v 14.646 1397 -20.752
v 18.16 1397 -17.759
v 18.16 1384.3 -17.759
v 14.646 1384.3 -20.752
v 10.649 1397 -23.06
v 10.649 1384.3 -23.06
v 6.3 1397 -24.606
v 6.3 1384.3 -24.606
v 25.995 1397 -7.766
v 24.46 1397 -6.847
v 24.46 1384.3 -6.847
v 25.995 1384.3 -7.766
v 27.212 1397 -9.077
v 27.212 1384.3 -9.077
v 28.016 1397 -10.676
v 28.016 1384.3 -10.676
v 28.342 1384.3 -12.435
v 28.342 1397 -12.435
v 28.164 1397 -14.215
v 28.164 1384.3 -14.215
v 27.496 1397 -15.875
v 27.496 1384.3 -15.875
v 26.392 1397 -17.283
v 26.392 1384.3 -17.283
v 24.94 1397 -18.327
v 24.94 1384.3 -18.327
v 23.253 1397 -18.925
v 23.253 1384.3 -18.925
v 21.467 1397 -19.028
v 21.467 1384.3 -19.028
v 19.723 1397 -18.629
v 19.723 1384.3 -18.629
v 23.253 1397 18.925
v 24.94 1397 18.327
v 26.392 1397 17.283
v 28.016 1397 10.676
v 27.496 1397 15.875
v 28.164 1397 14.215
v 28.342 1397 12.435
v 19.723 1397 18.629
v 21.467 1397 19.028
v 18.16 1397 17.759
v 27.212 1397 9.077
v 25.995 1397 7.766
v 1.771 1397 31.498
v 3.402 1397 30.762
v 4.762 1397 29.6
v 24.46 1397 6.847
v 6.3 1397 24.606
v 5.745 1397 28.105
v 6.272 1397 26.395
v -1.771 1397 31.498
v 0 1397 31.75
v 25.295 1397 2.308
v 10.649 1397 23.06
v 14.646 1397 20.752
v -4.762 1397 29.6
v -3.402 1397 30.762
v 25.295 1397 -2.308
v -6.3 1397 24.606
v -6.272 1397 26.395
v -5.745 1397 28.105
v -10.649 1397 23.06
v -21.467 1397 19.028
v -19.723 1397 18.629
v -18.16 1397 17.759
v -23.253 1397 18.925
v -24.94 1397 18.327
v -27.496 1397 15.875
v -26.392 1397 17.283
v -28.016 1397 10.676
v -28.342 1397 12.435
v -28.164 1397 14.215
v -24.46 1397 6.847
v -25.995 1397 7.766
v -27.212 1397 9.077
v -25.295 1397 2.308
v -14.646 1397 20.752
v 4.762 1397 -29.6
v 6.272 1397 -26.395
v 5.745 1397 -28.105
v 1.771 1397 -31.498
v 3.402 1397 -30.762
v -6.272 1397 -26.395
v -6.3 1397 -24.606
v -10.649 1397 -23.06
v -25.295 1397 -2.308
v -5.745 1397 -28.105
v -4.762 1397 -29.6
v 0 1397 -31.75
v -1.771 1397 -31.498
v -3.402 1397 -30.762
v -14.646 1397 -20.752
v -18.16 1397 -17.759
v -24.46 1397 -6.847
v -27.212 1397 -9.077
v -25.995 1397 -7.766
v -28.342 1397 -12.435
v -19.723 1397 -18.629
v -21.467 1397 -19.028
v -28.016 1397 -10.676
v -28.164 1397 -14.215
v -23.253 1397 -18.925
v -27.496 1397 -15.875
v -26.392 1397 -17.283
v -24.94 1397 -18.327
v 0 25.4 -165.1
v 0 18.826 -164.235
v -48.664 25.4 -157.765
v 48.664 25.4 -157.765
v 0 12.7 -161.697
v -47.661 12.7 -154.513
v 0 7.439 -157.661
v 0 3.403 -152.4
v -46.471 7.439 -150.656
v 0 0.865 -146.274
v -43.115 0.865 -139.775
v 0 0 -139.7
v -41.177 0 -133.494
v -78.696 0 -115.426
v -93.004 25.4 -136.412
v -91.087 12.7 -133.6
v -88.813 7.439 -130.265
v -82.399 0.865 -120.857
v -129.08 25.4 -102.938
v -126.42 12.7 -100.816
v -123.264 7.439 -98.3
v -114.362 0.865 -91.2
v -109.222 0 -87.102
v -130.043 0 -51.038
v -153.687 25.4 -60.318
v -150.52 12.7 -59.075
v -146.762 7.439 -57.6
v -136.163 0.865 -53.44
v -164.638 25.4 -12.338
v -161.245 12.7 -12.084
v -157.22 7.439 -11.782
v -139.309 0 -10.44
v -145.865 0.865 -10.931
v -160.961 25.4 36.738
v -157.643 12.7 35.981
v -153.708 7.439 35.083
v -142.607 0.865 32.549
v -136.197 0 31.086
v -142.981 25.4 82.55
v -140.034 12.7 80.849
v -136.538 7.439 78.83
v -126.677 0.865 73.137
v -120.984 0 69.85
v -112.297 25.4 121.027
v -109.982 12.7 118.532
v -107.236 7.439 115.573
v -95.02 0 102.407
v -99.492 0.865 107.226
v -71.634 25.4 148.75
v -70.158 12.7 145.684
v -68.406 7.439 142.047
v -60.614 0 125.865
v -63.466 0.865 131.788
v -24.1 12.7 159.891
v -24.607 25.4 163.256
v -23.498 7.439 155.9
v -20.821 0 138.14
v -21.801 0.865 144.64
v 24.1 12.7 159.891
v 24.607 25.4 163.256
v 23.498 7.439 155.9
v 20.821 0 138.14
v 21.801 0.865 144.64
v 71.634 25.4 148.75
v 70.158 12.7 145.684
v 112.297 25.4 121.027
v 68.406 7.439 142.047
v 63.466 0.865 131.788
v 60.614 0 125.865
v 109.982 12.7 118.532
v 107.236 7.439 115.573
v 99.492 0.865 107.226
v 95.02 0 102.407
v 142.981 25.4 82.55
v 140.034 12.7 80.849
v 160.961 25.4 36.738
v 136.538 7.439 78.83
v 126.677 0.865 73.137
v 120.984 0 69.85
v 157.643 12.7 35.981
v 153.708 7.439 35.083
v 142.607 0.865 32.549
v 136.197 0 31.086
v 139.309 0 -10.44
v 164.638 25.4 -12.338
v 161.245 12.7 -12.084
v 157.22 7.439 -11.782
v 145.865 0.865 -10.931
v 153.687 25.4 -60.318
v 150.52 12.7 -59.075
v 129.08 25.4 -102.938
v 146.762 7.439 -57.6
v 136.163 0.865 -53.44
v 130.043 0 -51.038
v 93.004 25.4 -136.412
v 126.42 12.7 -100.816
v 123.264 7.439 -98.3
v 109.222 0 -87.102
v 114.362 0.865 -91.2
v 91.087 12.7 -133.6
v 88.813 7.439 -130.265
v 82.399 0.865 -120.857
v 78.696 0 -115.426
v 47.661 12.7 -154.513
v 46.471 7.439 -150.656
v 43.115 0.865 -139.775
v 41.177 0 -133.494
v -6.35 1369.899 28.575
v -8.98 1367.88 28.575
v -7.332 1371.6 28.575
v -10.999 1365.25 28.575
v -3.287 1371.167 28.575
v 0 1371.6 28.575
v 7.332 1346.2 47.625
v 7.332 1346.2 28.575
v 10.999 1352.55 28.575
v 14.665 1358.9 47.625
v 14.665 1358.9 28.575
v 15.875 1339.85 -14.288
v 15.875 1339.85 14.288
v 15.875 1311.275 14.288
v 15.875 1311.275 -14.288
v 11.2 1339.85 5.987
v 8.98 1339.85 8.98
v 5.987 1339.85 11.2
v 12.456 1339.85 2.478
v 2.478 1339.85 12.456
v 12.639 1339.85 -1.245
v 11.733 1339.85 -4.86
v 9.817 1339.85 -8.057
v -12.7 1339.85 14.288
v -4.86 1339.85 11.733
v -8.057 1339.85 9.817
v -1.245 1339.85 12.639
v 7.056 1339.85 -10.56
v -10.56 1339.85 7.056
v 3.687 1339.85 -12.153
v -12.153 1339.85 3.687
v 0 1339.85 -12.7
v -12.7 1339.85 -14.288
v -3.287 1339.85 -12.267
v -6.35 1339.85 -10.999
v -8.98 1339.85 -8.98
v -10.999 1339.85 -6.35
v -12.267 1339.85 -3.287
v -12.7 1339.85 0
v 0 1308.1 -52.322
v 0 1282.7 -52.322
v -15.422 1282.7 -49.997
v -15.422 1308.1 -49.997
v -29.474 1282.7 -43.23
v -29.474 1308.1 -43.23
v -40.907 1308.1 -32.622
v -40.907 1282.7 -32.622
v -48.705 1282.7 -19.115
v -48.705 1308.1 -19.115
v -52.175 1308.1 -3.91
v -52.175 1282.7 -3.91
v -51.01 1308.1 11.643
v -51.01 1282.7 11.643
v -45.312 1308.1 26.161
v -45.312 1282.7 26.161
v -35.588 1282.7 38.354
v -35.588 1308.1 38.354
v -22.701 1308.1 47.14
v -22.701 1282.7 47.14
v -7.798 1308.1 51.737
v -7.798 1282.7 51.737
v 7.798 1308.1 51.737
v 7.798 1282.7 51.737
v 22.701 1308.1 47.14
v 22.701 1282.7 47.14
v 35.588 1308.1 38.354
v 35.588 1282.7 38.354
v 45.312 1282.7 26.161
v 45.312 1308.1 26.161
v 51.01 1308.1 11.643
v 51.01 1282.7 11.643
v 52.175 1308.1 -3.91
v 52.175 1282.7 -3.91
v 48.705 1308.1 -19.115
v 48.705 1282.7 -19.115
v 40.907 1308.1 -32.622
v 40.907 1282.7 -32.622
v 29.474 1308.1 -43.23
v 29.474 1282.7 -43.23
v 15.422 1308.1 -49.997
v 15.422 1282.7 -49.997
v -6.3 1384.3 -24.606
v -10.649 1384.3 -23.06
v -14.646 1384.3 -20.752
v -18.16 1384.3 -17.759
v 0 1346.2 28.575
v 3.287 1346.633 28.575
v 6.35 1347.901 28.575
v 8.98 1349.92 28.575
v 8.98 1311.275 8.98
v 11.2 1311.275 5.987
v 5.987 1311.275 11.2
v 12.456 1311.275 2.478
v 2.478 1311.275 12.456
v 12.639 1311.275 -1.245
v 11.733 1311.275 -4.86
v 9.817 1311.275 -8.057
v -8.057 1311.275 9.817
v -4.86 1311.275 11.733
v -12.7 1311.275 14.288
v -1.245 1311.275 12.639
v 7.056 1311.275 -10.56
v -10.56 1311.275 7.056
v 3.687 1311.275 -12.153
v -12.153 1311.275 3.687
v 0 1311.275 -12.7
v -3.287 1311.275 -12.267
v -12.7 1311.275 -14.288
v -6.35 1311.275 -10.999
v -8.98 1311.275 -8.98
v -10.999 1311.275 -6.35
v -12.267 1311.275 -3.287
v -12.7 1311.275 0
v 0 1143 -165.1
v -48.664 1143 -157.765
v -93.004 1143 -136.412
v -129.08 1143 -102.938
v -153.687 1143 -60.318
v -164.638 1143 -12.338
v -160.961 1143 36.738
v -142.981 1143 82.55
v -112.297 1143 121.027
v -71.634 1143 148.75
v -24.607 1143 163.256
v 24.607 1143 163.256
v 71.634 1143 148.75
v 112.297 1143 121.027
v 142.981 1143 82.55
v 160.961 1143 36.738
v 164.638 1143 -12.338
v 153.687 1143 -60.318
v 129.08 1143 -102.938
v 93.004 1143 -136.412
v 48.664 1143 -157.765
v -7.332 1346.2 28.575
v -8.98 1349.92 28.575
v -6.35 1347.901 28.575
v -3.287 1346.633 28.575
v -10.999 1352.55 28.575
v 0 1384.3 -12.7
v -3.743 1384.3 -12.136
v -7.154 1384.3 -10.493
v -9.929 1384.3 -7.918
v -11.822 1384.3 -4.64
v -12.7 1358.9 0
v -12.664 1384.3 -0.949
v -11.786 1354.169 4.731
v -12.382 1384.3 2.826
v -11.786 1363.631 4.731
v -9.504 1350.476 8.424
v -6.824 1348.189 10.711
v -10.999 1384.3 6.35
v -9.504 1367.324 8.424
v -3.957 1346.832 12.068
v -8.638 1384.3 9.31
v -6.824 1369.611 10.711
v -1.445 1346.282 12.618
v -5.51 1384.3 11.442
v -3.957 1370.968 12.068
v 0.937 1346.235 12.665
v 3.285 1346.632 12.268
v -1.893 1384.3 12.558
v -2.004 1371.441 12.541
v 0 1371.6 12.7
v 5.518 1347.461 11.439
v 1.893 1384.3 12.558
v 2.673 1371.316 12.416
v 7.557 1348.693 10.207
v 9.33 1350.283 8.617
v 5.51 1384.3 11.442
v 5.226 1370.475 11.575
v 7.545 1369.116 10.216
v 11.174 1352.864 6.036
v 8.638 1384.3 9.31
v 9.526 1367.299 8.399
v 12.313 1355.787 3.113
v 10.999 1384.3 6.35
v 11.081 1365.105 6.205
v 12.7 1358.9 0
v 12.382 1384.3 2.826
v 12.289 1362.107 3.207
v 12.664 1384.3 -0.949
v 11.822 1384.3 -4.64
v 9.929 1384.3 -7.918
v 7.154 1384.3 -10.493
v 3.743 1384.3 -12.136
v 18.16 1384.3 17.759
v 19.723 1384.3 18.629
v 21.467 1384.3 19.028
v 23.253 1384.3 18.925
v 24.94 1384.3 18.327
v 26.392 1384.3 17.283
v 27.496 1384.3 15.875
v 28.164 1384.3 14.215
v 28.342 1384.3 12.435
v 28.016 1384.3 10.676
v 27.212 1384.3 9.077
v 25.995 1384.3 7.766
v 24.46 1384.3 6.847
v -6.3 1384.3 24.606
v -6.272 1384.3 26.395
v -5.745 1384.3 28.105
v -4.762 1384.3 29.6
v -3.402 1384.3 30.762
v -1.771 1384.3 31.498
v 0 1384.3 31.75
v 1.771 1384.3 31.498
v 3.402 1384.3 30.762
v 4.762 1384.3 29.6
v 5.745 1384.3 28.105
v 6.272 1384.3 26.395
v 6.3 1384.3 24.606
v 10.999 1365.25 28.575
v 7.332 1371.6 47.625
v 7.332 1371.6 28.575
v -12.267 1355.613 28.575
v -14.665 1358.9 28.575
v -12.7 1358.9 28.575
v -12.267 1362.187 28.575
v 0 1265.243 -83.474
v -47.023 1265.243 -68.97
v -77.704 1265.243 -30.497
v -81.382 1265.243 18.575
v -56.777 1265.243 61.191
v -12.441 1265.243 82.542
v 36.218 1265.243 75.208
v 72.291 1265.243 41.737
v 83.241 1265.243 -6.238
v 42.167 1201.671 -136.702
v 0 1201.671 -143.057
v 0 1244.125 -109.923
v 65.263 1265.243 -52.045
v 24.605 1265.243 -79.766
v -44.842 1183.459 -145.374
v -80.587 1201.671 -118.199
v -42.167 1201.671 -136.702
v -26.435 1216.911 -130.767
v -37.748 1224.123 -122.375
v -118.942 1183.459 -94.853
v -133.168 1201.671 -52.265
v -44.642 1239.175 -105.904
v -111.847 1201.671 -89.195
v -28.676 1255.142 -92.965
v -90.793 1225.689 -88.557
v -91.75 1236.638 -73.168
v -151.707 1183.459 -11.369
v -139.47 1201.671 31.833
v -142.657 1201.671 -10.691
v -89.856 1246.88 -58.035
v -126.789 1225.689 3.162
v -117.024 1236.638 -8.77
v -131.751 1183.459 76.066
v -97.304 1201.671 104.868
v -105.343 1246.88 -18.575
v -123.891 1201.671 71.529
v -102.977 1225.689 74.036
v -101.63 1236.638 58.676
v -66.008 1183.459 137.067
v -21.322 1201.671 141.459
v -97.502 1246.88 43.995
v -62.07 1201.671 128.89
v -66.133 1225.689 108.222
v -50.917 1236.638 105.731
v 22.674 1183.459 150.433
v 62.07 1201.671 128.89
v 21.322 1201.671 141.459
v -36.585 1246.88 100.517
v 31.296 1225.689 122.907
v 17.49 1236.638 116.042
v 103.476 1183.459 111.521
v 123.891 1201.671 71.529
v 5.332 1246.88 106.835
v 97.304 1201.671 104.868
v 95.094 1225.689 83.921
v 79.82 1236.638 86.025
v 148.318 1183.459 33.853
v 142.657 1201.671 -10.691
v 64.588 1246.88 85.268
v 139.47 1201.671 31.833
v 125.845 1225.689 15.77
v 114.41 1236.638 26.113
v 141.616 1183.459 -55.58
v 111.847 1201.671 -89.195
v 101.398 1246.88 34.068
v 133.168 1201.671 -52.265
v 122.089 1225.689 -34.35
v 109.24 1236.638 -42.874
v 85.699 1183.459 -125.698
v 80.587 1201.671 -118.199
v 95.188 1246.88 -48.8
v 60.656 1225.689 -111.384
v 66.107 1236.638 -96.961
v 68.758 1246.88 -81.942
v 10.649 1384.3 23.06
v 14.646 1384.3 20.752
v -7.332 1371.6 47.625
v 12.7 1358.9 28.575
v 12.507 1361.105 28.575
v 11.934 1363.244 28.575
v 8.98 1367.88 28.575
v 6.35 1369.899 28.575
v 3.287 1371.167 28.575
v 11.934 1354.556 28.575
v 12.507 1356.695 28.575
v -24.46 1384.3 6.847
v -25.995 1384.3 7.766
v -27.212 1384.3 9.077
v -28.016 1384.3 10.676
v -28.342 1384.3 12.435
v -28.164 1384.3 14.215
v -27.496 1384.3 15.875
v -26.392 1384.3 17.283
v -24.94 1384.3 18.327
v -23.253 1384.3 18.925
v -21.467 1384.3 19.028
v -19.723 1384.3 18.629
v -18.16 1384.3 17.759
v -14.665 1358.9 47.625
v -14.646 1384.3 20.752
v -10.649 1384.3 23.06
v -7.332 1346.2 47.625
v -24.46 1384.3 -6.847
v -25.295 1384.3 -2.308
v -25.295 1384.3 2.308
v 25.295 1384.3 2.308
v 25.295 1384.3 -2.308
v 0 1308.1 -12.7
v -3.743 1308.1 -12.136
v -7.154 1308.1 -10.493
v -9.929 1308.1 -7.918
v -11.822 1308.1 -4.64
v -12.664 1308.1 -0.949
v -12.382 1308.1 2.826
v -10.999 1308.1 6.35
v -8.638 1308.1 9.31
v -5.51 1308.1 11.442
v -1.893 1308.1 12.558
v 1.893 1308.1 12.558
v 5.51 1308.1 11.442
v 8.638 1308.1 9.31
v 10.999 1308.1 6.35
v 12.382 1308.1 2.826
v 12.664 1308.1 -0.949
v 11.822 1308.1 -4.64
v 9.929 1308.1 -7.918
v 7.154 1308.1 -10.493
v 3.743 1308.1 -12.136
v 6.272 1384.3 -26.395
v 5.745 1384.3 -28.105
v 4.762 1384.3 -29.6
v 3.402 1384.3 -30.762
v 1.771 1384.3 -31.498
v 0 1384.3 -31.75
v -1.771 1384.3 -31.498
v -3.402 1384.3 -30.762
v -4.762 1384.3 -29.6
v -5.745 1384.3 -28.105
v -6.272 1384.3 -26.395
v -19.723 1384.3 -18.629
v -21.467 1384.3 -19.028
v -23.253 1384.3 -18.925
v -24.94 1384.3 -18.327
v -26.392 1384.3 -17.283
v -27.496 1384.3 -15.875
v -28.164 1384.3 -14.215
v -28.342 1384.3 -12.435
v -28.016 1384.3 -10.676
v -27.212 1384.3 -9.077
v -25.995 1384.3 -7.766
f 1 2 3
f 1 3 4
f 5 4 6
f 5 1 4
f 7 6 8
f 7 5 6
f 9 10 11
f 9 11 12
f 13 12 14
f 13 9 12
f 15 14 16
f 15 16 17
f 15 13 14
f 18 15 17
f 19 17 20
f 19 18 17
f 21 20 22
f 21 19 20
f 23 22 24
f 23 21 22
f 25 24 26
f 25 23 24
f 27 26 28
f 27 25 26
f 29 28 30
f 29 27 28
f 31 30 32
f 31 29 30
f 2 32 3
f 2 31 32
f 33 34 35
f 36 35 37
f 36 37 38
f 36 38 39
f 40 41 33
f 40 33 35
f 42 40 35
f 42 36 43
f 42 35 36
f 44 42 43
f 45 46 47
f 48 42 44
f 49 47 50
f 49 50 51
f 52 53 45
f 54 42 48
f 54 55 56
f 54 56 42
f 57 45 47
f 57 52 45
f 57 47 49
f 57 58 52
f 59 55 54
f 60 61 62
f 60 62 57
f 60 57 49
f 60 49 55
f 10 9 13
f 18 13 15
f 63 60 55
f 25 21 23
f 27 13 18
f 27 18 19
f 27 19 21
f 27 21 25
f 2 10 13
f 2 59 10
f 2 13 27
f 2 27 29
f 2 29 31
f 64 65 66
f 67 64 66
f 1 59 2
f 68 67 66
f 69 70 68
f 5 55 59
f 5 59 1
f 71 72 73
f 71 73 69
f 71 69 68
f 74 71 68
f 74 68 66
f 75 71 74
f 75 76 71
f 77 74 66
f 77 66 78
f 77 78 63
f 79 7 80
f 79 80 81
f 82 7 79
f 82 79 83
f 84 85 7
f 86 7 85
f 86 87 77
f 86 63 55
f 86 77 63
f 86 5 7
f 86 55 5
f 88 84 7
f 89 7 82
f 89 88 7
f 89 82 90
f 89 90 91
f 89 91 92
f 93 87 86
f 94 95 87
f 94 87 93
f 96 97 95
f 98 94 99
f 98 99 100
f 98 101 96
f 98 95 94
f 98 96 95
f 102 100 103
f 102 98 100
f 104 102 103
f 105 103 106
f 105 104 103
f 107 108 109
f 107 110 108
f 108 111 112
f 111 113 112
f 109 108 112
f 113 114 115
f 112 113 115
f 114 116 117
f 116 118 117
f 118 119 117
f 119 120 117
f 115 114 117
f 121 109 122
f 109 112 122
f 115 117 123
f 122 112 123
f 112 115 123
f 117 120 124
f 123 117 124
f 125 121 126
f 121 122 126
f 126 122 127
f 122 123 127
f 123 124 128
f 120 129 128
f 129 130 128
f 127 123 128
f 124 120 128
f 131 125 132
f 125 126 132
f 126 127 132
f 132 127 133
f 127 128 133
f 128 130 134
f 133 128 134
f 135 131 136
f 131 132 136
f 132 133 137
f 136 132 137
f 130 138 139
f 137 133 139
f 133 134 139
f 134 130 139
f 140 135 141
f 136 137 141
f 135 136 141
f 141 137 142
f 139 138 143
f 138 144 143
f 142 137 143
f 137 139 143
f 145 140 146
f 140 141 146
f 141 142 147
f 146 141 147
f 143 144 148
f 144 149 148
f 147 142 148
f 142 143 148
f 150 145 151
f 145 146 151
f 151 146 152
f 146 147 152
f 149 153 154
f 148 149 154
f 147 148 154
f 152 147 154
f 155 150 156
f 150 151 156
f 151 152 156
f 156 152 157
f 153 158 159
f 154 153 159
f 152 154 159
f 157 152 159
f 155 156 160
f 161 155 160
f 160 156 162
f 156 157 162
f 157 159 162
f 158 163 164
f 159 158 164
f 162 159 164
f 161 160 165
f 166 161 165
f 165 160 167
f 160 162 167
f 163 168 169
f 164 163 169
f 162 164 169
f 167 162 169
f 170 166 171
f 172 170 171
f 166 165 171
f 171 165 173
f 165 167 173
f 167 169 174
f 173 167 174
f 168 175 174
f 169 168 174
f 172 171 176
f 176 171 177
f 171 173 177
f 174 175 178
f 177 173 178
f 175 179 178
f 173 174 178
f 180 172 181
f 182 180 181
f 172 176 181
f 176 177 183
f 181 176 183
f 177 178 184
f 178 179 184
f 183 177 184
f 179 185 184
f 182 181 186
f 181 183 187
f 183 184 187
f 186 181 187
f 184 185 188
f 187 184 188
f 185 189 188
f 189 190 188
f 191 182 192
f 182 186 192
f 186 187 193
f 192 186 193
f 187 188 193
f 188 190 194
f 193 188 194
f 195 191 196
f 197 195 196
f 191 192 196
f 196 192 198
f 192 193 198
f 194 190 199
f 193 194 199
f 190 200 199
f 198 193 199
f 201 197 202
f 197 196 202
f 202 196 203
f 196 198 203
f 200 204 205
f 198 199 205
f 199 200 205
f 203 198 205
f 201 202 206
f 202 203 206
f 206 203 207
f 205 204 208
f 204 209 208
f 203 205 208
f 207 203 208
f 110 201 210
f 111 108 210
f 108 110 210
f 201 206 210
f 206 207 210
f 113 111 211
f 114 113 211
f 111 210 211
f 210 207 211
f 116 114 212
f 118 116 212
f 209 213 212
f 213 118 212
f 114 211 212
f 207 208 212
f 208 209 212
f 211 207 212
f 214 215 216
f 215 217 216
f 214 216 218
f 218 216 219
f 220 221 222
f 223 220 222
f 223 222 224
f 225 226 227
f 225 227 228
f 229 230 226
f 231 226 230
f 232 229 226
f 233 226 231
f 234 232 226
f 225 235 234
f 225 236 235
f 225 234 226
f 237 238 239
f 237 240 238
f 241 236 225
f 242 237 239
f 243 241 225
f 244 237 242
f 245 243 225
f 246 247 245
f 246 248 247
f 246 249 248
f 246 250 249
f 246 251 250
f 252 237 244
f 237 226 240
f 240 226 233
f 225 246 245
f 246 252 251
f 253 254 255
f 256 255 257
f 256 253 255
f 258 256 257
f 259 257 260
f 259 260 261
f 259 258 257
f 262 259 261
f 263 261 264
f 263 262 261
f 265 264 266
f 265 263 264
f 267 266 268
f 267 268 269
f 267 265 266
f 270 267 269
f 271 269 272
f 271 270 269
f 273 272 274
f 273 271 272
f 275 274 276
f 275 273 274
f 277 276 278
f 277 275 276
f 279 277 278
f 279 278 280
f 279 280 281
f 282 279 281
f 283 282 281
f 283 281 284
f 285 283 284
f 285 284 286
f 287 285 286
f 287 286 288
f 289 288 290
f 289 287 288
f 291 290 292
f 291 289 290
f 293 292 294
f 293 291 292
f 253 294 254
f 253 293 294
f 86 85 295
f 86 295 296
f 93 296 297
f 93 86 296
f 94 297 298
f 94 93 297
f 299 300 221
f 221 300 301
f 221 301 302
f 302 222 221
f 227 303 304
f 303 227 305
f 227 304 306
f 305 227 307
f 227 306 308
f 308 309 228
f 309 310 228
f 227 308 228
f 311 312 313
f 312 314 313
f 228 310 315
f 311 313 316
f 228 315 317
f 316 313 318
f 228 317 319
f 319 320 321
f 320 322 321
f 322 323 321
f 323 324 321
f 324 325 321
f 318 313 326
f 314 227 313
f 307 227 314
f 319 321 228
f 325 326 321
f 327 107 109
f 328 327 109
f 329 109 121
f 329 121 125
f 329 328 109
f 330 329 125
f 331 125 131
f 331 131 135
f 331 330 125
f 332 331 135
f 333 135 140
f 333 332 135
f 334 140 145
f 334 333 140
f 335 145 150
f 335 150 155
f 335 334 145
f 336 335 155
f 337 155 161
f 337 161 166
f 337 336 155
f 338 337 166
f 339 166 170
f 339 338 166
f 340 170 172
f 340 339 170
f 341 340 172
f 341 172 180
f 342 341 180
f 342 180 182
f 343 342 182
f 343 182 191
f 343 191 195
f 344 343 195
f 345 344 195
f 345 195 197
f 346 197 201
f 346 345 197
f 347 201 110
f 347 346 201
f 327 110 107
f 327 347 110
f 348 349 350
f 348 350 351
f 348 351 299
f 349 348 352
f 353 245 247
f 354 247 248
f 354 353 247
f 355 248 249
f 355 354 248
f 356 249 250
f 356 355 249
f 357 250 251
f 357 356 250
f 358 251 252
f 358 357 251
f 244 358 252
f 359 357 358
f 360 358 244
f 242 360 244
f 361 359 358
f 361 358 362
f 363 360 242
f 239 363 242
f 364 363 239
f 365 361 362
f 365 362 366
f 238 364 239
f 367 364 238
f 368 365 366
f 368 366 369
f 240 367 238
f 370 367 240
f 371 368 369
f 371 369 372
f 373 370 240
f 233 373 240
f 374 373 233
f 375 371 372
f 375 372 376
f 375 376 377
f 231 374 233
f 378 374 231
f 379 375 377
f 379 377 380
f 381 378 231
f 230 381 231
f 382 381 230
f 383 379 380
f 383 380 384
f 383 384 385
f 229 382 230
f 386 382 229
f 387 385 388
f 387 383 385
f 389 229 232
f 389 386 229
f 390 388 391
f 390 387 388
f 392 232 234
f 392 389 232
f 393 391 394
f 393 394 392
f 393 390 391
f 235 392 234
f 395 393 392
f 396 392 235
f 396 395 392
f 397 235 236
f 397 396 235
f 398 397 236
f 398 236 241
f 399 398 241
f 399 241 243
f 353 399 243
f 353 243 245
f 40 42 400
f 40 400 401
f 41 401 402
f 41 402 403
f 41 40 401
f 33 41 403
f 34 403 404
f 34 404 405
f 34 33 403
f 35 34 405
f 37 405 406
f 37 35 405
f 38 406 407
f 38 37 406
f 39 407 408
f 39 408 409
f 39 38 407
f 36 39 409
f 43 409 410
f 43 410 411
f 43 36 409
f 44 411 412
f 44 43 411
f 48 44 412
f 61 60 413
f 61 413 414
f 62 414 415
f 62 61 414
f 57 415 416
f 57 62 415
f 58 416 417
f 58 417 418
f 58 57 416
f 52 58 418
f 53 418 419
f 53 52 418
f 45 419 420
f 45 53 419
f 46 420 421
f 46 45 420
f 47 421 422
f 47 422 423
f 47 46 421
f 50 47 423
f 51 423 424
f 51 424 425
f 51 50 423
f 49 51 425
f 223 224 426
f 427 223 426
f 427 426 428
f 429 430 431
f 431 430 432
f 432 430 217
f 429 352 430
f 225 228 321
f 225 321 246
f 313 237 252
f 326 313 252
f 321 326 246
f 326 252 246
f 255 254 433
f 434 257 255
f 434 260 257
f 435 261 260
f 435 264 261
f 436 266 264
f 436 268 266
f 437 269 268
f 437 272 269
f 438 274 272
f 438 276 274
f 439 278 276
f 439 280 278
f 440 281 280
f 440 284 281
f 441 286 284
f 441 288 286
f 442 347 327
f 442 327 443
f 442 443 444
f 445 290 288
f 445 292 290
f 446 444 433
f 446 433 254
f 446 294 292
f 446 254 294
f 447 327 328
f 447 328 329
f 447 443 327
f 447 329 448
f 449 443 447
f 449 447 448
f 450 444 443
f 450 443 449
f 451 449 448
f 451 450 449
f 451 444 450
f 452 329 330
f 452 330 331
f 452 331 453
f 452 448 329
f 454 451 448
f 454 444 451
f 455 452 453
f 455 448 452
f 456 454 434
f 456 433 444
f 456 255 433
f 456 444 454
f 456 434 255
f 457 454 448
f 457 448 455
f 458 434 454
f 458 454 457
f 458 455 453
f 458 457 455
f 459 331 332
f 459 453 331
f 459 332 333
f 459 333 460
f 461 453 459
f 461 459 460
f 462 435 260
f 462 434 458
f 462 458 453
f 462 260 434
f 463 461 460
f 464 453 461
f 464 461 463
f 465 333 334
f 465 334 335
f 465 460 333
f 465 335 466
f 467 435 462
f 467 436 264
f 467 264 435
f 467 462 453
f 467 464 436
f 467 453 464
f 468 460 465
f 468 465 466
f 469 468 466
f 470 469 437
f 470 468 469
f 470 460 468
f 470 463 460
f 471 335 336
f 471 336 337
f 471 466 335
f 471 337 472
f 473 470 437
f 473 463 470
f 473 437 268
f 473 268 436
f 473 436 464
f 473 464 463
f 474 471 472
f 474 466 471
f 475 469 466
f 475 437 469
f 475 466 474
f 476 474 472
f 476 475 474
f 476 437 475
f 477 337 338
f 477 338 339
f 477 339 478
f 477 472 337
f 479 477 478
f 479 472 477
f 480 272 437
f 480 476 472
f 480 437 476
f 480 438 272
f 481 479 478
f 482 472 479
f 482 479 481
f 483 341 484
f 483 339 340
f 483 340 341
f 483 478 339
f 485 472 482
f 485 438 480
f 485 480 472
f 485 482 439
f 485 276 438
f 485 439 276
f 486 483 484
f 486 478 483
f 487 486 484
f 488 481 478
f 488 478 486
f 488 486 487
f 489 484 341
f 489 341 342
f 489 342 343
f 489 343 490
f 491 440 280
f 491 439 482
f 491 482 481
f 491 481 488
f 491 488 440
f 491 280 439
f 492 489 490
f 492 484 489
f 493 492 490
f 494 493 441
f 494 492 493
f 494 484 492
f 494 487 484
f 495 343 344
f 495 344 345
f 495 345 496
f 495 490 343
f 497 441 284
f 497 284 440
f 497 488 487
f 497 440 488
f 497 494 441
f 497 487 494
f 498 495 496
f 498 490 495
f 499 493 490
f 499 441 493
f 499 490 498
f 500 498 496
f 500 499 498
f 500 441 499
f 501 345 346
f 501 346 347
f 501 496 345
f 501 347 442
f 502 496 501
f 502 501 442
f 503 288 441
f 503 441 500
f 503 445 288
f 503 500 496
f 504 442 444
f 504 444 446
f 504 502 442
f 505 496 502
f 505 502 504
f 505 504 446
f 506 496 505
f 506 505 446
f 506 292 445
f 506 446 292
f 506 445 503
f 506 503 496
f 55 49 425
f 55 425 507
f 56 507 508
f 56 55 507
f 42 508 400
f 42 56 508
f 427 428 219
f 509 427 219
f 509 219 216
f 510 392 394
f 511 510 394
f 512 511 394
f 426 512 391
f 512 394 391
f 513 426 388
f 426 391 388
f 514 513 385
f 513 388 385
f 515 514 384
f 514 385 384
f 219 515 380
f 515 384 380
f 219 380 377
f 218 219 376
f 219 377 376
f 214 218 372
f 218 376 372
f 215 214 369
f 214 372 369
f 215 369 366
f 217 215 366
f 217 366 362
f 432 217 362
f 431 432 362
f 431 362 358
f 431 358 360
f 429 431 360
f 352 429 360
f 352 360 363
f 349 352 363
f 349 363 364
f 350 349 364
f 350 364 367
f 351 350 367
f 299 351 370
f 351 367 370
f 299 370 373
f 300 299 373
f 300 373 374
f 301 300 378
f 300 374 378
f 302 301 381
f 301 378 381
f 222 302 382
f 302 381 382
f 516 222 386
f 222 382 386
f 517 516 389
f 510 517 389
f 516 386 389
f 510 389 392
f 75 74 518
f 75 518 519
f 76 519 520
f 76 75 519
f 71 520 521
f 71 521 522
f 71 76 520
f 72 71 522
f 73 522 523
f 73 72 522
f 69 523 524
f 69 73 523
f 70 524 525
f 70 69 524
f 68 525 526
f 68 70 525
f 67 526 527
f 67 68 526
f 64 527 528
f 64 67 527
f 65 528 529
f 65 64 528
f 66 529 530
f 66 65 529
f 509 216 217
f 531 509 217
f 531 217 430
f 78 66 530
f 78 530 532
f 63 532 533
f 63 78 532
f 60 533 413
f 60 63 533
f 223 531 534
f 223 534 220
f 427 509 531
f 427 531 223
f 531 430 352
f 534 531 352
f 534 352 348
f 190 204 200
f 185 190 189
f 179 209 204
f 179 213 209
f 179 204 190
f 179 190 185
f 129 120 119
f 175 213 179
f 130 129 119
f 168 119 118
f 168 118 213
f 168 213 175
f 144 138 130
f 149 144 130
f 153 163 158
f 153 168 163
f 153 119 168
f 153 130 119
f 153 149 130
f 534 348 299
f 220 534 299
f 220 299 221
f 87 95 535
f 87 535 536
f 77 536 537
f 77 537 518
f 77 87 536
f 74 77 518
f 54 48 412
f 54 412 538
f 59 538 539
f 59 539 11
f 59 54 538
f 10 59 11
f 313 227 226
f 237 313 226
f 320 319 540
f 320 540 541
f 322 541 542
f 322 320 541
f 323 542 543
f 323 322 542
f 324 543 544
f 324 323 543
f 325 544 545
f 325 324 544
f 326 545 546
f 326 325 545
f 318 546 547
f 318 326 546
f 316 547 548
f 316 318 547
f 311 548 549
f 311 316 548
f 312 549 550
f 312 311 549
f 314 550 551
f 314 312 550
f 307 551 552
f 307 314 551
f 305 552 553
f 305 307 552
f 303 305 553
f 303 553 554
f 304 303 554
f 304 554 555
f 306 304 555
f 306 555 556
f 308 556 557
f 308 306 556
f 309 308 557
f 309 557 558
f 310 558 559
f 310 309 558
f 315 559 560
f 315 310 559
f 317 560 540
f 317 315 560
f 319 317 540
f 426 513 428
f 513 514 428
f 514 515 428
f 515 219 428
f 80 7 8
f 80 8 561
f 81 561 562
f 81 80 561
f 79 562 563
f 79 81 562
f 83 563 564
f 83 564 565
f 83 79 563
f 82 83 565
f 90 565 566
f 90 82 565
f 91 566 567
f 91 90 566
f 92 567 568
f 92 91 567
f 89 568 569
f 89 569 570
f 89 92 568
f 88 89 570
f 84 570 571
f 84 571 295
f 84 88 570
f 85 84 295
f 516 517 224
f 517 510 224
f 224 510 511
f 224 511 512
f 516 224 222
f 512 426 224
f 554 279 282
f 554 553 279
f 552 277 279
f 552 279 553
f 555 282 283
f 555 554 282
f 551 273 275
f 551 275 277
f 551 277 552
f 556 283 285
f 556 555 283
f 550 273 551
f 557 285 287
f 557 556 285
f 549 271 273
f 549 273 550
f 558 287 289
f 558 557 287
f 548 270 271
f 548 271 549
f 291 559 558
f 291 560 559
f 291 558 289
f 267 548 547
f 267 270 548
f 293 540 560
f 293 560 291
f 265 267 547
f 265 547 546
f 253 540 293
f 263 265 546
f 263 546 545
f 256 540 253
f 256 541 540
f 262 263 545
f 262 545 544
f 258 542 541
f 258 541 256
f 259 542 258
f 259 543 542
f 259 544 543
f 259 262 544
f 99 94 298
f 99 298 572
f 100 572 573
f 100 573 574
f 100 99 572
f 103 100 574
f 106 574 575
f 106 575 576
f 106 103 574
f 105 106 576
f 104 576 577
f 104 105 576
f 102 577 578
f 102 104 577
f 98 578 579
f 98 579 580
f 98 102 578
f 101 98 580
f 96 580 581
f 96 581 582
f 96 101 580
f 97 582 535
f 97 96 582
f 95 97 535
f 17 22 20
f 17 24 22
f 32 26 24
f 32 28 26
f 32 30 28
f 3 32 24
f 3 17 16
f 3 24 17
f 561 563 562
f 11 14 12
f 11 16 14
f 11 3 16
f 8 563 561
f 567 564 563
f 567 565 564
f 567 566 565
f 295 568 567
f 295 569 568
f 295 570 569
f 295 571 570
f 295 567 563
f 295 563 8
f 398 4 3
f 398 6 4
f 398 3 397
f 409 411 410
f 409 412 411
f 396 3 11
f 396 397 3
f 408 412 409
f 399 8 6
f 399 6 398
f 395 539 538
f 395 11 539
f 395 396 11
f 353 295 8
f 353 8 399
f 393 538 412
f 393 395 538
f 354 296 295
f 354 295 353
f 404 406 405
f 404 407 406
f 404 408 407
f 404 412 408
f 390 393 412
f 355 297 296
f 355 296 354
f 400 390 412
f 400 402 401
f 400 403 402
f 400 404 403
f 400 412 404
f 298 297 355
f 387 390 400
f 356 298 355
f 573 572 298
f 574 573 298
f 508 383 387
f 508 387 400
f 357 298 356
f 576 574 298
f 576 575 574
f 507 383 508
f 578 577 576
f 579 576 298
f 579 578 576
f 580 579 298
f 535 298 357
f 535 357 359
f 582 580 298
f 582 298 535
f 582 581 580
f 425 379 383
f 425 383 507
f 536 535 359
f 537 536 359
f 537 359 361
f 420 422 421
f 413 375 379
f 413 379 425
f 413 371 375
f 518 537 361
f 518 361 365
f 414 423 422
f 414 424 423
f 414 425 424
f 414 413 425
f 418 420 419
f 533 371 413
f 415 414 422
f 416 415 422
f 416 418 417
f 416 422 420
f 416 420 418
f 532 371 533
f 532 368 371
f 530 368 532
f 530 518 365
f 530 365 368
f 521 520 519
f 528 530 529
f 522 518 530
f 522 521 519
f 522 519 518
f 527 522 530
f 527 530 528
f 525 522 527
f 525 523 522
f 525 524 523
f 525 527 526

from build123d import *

# Parameters (mm, degrees)
BOSS_EXTRUDE1_DEPTH = 12.7
BOSS_EXTRUDE2_START = -12.7
SKETCH3_W           = 28.575
SKETCH3_H           = 28.575
BOSS_EXTRUDE2_DEPTH = 28.575
SKETCH4_R           = 12.7
BOSS_EXTRUDE3_DEPTH = 28.575
BOSS_EXTRUDE4_DEPTH = 19.05
FILLET1_R           = 25.4


with BuildPart() as part:
    # Sketch1 → Revolve1 (revolve)
    with BuildSketch(Plane.XY, mode=Mode.PRIVATE) as revolve1_sk:
        with BuildLine():
            Line((0, 0), (165.1, 0))
            Line((165.1, 0), (165.1, 1143))
            add(Edge.make_bspline(
                [(165.1, 1143), (143.698147325, 1240.08378947), (52.321616657, 1282.7)],
                knots=[0, 0, 0, 1, 1, 1], degree=2))
            Line((52.321616657, 1282.7), (52.321616657, 1308.1))
            Line((52.321616657, 1308.1), (12.7, 1308.1))
            Line((12.7, 1308.1), (12.7, 1384.3))
            Line((12.7, 1384.3), (25.4, 1384.3))
            Line((25.4, 1384.3), (25.4, 1397))
            Line((25.4, 1397), (0, 1397))
            Line((0, 1397), (0, 0))
        make_face()
    revolve(revolve1_sk.sketch.rotate(Axis((0, 0, 0), (0, 1, 0)), 90), axis=Axis((0, 0, 0), (0, 1, 0)))

    # Sketch2 → Boss-Extrude1 (add)
    with BuildSketch(Plane(origin=(0, 1397, 0), x_dir=(1, 0, 0), z_dir=(0, 1, 0))):
        with BuildLine():
            ThreePointArc((-18.159539937, -17.759254187), (-12.7, -21.997045256), (-6.300195309, -24.60625))
            ThreePointArc((-6.300195309, -24.60625), (0, -31.75), (6.300195309, -24.60625))
            ThreePointArc((6.300195309, -24.60625), (12.7, -21.997045256), (18.159539937, -17.759254187))
            ThreePointArc((18.159539937, -17.759254187), (27.49630657, -15.875), (24.459735247, -6.846995813))
            ThreePointArc((24.459735247, -6.846995813), (25.4, 0), (24.459735247, 6.846995813))
            ThreePointArc((24.459735247, 6.846995813), (27.49630657, 15.875), (18.159539937, 17.759254187))
            ThreePointArc((18.159539937, 17.759254187), (12.7, 21.997045256), (6.300195309, 24.60625))
            ThreePointArc((6.300195309, 24.60625), (0, 31.75), (-6.300195309, 24.60625))
            ThreePointArc((-6.300195309, 24.60625), (-12.7, 21.997045256), (-18.159539937, 17.759254187))
            ThreePointArc((-18.159539937, 17.759254187), (-27.49630657, 15.875), (-24.459735247, 6.846995813))
            ThreePointArc((-24.459735247, 6.846995813), (-25.4, 0), (-24.459735247, -6.846995813))
            ThreePointArc((-24.459735247, -6.846995813), (-27.49630657, -15.875), (-18.159539937, -17.759254187))
        make_face()
    extrude(amount=-BOSS_EXTRUDE1_DEPTH)

    # Sketch3 → Boss-Extrude2 (add)
    with BuildSketch(Plane(origin=(0, 0, 0), x_dir=(0, 0, -1), z_dir=(1, 0, 0)).offset(BOSS_EXTRUDE2_START)):
        with Locations((0, 1325.5625)):
            Rectangle(SKETCH3_W, SKETCH3_H)
    extrude(amount=BOSS_EXTRUDE2_DEPTH)

    # Sketch4 → Boss-Extrude3 (add)
    with BuildSketch(Plane.XY):
        with Locations((0, 1358.9)):
            Circle(SKETCH4_R)
    extrude(amount=BOSS_EXTRUDE3_DEPTH)

    # Sketch5 → Boss-Extrude4 (add)
    with BuildSketch(Plane.XY.offset(28.575)):
        Polygon((14.664696837, 1358.9), (7.332348419, 1371.6), (-7.332348419, 1371.6), (-14.664696837, 1358.9), (-7.332348419, 1346.2), (7.332348419, 1346.2), align=None)
    extrude(amount=BOSS_EXTRUDE4_DEPTH)

    # Fillet1
    fillet1_edges = [part.edges().sort_by_distance(p)[0] for p in [
        (0, 0, 165.1),
    ]]
    fillet(fillet1_edges, radius=FILLET1_R)


solid = part.part
